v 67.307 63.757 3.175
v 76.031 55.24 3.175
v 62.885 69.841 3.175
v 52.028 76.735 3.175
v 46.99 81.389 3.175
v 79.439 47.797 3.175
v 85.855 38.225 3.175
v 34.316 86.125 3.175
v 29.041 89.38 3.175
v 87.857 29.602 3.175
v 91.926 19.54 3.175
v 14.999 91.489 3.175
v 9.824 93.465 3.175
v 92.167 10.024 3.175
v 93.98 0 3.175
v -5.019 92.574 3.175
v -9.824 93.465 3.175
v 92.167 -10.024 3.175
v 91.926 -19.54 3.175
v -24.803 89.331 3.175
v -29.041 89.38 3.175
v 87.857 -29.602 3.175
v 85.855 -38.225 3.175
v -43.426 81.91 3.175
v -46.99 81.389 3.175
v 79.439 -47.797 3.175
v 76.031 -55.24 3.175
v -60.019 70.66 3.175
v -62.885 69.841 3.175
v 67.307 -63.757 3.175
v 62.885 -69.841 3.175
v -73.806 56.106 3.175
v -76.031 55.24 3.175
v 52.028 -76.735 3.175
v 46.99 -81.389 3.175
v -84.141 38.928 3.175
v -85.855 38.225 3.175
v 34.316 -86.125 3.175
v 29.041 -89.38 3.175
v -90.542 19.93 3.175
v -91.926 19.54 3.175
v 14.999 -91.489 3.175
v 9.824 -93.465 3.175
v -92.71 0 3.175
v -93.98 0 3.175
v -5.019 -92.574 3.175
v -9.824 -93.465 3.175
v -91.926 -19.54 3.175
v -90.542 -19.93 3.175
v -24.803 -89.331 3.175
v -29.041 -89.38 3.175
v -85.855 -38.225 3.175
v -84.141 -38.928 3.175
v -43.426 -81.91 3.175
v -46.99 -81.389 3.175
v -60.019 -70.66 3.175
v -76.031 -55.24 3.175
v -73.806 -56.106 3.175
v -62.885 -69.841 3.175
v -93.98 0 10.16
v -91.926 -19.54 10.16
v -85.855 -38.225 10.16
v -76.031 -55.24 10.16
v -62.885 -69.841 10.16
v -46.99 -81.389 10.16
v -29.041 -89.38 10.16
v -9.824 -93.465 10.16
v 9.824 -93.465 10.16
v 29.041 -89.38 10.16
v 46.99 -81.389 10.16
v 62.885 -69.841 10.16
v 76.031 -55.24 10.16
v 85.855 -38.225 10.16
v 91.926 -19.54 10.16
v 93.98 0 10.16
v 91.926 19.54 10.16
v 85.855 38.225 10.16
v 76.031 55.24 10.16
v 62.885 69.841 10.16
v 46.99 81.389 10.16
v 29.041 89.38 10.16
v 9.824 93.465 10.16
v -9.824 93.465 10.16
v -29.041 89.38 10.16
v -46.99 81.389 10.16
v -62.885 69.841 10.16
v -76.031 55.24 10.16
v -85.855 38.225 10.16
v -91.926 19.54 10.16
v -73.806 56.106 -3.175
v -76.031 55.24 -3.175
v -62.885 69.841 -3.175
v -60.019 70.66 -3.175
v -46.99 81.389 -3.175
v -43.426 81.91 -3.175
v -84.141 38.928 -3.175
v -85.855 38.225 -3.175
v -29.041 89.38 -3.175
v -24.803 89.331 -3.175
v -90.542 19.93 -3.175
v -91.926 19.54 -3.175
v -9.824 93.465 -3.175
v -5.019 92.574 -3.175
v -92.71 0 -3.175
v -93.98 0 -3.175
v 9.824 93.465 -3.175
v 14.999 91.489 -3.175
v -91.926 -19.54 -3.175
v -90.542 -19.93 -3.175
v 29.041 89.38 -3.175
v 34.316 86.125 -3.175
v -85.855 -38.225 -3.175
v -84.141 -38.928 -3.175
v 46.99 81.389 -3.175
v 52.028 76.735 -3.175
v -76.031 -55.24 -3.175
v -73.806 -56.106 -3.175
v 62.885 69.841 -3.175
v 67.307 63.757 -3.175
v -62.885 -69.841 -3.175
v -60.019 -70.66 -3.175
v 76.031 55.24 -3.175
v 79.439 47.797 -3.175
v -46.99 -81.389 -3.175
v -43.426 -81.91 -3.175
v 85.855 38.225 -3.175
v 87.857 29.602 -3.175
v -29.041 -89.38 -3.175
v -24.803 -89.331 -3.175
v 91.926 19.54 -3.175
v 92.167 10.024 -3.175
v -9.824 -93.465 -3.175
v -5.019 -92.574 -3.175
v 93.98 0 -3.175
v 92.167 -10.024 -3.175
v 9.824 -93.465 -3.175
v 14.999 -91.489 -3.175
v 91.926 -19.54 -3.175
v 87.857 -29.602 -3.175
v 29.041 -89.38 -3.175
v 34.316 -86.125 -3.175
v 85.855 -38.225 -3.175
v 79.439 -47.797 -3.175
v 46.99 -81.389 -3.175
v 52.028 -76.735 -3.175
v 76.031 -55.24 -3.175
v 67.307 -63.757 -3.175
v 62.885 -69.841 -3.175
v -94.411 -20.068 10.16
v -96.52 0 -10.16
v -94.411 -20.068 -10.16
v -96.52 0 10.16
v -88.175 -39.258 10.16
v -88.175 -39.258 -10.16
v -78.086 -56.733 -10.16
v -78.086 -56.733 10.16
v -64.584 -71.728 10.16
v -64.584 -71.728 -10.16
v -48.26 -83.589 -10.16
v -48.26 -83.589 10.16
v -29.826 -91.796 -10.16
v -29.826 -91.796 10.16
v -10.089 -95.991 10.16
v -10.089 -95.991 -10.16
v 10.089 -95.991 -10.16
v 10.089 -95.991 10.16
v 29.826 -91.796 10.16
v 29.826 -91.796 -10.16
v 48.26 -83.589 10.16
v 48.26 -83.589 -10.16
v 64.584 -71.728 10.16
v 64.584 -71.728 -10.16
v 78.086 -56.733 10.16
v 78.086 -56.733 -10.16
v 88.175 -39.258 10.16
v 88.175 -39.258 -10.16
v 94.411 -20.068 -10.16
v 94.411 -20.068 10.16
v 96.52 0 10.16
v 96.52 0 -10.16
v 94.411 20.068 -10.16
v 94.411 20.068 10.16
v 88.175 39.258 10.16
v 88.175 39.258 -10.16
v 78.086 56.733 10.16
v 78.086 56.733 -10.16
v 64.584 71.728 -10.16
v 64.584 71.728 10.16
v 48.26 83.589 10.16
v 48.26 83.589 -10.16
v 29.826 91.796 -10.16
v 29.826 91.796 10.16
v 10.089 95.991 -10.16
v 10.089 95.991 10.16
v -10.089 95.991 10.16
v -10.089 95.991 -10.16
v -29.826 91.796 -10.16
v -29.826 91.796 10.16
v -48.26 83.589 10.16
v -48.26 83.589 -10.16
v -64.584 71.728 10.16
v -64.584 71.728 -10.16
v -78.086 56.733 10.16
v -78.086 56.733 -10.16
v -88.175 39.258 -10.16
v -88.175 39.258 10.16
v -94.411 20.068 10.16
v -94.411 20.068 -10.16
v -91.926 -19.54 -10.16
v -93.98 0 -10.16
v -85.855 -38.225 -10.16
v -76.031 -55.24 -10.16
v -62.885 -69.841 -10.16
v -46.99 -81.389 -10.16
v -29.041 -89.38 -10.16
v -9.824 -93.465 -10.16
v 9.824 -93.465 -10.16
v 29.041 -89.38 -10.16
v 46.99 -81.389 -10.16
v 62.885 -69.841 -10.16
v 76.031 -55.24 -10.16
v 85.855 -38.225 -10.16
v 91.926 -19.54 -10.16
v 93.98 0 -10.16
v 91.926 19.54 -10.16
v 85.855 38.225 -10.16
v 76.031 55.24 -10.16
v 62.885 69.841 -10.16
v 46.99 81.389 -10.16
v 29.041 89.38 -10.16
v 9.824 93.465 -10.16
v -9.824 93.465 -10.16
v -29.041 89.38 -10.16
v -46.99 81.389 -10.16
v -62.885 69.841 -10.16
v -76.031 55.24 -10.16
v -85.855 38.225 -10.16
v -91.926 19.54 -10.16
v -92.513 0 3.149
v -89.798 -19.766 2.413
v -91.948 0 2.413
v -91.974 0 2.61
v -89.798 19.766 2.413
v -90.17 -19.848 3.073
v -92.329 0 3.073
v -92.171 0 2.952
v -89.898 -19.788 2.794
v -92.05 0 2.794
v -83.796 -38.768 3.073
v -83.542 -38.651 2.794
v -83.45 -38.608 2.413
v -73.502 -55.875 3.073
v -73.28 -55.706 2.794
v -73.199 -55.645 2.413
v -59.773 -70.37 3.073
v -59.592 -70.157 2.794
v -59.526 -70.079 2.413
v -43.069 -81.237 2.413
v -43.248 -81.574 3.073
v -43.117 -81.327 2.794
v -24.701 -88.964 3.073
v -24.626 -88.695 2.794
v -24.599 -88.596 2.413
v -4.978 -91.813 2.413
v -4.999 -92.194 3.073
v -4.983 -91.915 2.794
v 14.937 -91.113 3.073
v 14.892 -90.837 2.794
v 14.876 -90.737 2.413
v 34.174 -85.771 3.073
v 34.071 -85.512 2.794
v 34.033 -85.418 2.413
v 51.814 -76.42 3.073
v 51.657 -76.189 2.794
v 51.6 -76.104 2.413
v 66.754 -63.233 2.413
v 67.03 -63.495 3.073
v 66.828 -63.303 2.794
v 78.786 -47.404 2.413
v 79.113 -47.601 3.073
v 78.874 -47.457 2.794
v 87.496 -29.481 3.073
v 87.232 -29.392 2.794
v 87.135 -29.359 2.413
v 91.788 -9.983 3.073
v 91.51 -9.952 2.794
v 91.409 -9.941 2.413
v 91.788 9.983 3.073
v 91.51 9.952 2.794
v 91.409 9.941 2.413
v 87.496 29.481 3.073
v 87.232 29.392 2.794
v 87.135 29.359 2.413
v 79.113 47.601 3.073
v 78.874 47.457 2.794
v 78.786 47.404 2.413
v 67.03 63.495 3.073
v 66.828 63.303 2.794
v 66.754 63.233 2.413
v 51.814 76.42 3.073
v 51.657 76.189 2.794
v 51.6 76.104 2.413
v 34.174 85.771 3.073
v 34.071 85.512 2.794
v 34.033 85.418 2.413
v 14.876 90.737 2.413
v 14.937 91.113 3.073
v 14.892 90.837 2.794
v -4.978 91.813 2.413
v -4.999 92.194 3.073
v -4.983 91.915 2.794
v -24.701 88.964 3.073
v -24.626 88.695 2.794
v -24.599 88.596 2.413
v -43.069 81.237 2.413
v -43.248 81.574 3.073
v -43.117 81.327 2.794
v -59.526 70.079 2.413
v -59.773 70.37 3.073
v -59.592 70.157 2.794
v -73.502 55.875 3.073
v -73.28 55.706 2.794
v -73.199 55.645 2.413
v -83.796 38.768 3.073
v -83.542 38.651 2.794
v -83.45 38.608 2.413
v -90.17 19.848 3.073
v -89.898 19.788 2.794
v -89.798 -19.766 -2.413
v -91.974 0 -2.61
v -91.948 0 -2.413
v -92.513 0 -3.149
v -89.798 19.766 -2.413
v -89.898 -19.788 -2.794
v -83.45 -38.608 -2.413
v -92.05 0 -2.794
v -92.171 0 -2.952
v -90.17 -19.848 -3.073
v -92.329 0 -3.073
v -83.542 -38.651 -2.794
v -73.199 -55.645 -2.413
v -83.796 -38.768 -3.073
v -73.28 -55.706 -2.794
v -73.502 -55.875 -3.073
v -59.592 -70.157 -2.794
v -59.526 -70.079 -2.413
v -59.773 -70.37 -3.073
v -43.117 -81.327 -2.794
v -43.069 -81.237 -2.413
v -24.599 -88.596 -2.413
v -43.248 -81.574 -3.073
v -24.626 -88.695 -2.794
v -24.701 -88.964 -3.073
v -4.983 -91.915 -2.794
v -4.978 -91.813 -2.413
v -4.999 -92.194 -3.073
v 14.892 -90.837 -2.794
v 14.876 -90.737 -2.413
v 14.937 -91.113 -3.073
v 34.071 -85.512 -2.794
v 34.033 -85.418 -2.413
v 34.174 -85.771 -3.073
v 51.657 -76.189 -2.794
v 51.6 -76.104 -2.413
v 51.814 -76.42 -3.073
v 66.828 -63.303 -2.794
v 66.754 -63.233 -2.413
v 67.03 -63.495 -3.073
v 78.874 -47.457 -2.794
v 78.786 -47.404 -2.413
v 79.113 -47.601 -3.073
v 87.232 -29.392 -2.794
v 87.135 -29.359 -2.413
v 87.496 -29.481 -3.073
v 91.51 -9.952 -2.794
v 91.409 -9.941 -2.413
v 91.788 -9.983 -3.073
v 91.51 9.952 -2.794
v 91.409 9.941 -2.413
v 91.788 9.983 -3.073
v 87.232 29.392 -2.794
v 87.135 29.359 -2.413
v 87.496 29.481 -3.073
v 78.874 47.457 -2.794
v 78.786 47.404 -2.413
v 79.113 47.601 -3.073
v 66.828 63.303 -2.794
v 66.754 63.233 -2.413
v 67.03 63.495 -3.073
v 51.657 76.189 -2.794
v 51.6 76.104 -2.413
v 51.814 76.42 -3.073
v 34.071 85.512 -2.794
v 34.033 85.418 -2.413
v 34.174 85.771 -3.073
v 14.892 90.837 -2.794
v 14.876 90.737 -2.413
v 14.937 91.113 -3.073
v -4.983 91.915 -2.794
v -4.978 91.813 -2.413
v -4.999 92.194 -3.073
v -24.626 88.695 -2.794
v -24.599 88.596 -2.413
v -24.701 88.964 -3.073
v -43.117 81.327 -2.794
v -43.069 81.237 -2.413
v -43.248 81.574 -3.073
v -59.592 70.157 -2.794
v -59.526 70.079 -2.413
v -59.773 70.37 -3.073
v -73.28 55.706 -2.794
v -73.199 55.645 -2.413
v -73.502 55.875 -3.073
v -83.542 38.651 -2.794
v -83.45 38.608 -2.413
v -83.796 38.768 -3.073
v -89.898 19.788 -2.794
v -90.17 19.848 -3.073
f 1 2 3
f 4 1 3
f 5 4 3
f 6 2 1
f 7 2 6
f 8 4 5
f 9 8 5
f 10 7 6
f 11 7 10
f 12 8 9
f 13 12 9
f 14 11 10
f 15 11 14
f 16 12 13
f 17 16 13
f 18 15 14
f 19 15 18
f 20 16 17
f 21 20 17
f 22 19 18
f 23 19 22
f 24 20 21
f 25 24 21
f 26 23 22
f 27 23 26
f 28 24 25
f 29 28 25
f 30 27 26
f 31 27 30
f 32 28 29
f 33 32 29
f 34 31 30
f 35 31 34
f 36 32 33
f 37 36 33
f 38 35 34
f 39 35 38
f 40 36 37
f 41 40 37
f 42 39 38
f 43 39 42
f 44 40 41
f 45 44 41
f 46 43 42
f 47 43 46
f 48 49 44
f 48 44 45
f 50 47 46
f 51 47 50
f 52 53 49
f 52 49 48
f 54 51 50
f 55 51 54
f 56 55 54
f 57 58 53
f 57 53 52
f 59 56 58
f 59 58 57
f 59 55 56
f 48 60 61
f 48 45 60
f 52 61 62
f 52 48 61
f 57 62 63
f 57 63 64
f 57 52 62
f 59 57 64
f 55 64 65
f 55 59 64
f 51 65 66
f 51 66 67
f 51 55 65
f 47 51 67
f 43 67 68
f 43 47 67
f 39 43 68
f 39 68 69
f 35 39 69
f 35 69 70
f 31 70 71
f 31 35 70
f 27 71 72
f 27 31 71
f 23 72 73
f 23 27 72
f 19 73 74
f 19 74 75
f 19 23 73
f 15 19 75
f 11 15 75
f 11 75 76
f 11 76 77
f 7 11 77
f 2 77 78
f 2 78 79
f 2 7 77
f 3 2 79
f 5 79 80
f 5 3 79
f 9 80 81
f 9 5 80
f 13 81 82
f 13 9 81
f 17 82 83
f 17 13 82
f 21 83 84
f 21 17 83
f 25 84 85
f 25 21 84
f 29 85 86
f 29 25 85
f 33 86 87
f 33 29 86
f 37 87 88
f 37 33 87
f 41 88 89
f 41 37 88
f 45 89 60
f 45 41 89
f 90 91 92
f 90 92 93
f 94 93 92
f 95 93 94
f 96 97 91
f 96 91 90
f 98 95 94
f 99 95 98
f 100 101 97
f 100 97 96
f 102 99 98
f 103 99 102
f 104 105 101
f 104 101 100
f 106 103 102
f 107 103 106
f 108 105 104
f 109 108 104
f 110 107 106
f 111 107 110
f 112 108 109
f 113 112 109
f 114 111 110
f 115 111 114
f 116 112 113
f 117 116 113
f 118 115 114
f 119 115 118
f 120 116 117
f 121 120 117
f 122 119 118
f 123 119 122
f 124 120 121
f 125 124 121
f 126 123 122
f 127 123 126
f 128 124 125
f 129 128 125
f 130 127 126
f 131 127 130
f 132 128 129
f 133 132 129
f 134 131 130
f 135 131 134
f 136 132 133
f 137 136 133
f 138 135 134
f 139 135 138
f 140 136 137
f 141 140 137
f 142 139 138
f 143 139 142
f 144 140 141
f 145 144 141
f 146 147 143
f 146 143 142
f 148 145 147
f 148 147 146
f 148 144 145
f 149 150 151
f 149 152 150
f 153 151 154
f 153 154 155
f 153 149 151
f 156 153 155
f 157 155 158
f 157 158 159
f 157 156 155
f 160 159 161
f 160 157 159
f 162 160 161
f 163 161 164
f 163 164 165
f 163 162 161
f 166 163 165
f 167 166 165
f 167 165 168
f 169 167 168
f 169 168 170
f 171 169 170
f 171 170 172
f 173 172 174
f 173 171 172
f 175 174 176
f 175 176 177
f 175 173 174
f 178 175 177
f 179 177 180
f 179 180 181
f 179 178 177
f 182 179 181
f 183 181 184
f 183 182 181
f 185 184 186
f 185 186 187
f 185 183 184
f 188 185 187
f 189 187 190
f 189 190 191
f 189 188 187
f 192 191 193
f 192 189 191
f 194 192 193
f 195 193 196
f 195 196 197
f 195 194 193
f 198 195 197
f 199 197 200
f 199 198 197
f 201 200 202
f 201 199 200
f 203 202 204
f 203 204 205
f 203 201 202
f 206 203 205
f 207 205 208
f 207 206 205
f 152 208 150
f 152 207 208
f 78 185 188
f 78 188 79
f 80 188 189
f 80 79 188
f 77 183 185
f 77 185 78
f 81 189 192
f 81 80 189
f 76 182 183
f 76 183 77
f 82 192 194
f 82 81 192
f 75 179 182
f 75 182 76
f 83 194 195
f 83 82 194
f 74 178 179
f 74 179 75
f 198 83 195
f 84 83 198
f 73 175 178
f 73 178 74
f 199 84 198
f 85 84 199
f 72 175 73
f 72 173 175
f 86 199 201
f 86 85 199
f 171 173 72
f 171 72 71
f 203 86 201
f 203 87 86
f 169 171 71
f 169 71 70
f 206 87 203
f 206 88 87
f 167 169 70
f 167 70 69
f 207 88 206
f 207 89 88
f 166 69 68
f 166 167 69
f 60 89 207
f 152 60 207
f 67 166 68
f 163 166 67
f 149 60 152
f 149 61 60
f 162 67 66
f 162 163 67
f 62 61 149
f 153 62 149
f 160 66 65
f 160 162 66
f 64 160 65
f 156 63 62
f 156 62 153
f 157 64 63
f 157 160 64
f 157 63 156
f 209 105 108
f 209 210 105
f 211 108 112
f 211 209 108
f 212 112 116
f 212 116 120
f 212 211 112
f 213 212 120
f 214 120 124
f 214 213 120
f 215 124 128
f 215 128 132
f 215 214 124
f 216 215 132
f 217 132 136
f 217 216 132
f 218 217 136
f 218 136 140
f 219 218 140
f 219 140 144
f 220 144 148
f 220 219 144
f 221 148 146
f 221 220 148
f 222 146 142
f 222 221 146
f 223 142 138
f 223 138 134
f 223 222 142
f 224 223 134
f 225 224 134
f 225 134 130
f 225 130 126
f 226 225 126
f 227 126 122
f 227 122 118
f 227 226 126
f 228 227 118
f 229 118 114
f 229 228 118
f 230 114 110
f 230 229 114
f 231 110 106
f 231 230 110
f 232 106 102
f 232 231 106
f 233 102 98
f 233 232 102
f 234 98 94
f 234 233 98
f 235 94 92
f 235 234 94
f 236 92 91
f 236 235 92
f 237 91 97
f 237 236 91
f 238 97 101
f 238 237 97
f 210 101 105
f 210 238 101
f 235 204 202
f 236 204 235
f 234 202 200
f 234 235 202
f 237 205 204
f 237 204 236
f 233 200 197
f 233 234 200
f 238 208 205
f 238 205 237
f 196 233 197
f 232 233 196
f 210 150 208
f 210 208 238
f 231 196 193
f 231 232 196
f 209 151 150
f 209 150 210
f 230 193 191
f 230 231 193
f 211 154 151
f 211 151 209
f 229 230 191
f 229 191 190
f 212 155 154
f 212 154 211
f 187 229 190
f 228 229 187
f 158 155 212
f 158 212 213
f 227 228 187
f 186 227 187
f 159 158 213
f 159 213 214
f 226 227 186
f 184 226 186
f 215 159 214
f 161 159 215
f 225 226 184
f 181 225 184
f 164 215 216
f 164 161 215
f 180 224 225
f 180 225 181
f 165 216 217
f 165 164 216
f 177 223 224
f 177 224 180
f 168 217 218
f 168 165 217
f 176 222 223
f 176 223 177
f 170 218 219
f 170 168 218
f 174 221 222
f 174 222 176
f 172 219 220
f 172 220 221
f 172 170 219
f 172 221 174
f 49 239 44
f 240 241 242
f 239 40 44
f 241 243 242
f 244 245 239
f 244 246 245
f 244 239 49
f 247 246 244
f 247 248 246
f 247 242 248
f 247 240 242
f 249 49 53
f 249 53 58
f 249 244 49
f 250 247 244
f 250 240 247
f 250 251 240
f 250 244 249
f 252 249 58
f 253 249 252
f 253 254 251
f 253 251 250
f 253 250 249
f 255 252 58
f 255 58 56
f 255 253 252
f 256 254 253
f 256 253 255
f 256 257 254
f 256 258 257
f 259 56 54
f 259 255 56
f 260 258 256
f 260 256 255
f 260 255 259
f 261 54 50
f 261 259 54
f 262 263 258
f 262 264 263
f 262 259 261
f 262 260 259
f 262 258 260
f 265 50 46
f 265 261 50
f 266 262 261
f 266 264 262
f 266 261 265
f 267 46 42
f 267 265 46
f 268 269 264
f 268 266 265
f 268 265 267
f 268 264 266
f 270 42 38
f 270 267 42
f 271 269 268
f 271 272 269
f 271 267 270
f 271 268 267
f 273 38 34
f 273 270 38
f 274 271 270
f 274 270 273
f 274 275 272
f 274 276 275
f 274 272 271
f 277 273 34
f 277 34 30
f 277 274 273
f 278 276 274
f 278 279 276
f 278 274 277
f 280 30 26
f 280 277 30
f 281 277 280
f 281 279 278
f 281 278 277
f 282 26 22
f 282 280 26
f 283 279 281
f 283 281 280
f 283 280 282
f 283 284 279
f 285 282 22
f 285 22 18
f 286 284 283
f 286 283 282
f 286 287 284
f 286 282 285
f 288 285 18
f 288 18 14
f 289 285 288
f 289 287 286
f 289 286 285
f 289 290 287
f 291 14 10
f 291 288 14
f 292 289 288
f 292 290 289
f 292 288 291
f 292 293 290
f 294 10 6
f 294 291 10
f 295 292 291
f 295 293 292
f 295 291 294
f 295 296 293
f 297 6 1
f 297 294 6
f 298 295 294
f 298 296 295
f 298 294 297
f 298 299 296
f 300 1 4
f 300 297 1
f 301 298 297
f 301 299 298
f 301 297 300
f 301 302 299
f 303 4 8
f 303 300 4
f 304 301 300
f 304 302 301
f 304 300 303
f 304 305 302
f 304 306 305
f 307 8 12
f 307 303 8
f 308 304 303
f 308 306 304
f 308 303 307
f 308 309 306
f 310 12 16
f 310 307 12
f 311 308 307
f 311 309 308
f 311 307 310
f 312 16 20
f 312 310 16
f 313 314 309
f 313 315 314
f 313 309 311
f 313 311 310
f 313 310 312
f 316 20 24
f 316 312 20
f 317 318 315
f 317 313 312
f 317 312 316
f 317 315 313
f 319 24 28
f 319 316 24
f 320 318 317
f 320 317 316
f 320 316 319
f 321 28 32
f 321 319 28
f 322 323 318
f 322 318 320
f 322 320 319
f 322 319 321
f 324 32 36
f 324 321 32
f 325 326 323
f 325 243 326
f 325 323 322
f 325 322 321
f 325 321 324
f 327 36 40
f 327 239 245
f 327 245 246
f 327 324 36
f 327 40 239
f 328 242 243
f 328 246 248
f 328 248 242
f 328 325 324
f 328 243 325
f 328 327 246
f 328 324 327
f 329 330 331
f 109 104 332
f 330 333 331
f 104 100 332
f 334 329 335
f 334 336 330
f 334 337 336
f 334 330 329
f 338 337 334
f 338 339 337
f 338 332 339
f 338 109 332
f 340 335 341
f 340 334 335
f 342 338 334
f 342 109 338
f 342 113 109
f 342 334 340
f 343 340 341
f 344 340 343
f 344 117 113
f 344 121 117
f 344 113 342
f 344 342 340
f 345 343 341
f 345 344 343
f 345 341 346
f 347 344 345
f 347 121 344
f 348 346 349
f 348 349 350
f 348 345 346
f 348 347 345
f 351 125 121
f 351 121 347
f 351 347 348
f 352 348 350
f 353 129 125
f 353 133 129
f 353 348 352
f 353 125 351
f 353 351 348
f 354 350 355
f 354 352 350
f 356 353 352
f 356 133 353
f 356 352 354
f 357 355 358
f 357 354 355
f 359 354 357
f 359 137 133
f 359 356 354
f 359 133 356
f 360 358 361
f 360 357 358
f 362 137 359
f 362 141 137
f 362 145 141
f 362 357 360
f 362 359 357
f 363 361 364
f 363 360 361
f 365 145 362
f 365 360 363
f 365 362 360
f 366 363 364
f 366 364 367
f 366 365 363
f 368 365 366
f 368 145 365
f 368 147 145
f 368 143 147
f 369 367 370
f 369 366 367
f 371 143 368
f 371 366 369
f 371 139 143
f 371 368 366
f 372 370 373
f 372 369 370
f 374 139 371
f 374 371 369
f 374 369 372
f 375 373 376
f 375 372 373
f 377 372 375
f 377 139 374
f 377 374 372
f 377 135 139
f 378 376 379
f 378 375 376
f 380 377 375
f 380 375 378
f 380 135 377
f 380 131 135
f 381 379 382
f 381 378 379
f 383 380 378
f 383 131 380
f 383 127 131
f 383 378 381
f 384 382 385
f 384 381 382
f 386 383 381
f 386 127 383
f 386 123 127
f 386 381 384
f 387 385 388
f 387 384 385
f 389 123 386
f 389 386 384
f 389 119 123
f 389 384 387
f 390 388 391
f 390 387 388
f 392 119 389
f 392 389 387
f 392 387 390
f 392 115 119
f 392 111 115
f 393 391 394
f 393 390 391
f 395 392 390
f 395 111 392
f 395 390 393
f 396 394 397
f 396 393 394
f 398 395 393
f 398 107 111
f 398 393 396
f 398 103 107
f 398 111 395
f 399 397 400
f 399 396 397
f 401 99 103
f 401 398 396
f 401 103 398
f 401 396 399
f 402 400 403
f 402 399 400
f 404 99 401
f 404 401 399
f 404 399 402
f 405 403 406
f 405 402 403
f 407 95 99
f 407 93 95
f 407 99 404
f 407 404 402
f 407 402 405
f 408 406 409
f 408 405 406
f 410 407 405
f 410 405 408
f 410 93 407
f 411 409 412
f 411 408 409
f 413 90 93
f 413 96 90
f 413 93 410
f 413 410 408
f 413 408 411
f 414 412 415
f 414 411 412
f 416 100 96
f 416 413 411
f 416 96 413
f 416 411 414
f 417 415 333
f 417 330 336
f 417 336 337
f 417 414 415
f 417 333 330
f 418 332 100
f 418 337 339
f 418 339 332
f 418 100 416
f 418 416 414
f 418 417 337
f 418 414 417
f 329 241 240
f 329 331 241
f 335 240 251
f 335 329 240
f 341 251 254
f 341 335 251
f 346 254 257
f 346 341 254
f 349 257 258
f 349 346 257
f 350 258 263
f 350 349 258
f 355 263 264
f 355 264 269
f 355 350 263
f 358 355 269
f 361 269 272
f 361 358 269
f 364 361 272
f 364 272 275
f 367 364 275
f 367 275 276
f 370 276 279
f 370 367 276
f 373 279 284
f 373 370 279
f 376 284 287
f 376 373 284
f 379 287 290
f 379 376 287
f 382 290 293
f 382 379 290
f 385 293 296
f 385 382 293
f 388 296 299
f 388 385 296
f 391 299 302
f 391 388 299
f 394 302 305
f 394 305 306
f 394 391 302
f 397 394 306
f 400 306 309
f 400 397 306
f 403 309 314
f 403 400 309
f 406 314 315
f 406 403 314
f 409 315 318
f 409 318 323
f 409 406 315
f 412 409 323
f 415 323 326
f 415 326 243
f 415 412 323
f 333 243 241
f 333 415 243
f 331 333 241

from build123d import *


with BuildPart() as part:
    # Sketch2 → Revolve1 (revolve)
    with BuildSketch(Plane(origin=(0, 0, 0), x_dir=(0, 0, -1), z_dir=(1, 0, 0)), mode=Mode.PRIVATE) as revolve1_sk:
        with BuildLine():
            Line((-3.175, 93.98), (-3.175, 92.71))
            ThreePointArc((-3.175, 92.71), (-2.951815367, 92.171184633), (-2.413, 91.948))
            Line((-2.413, 91.948), (2.413, 91.948))
            ThreePointArc((2.413, 91.948), (2.951815367, 92.171184633), (3.175, 92.71))
            Line((3.175, 92.71), (3.175, 93.98))
            Line((3.175, 93.98), (10.16, 93.98))
            Line((10.16, 93.98), (10.16, 96.52))
            Line((10.16, 96.52), (-10.16, 96.52))
            Line((-10.16, 96.52), (-10.16, 93.98))
            Line((-10.16, 93.98), (-3.175, 93.98))
        make_face()
    revolve(revolve1_sk.sketch.rotate(Axis((0, 0, -11.176), (0, 0, 1)), 90), axis=Axis((0, 0, -11.176), (0, 0, 1)))


solid = part.part
